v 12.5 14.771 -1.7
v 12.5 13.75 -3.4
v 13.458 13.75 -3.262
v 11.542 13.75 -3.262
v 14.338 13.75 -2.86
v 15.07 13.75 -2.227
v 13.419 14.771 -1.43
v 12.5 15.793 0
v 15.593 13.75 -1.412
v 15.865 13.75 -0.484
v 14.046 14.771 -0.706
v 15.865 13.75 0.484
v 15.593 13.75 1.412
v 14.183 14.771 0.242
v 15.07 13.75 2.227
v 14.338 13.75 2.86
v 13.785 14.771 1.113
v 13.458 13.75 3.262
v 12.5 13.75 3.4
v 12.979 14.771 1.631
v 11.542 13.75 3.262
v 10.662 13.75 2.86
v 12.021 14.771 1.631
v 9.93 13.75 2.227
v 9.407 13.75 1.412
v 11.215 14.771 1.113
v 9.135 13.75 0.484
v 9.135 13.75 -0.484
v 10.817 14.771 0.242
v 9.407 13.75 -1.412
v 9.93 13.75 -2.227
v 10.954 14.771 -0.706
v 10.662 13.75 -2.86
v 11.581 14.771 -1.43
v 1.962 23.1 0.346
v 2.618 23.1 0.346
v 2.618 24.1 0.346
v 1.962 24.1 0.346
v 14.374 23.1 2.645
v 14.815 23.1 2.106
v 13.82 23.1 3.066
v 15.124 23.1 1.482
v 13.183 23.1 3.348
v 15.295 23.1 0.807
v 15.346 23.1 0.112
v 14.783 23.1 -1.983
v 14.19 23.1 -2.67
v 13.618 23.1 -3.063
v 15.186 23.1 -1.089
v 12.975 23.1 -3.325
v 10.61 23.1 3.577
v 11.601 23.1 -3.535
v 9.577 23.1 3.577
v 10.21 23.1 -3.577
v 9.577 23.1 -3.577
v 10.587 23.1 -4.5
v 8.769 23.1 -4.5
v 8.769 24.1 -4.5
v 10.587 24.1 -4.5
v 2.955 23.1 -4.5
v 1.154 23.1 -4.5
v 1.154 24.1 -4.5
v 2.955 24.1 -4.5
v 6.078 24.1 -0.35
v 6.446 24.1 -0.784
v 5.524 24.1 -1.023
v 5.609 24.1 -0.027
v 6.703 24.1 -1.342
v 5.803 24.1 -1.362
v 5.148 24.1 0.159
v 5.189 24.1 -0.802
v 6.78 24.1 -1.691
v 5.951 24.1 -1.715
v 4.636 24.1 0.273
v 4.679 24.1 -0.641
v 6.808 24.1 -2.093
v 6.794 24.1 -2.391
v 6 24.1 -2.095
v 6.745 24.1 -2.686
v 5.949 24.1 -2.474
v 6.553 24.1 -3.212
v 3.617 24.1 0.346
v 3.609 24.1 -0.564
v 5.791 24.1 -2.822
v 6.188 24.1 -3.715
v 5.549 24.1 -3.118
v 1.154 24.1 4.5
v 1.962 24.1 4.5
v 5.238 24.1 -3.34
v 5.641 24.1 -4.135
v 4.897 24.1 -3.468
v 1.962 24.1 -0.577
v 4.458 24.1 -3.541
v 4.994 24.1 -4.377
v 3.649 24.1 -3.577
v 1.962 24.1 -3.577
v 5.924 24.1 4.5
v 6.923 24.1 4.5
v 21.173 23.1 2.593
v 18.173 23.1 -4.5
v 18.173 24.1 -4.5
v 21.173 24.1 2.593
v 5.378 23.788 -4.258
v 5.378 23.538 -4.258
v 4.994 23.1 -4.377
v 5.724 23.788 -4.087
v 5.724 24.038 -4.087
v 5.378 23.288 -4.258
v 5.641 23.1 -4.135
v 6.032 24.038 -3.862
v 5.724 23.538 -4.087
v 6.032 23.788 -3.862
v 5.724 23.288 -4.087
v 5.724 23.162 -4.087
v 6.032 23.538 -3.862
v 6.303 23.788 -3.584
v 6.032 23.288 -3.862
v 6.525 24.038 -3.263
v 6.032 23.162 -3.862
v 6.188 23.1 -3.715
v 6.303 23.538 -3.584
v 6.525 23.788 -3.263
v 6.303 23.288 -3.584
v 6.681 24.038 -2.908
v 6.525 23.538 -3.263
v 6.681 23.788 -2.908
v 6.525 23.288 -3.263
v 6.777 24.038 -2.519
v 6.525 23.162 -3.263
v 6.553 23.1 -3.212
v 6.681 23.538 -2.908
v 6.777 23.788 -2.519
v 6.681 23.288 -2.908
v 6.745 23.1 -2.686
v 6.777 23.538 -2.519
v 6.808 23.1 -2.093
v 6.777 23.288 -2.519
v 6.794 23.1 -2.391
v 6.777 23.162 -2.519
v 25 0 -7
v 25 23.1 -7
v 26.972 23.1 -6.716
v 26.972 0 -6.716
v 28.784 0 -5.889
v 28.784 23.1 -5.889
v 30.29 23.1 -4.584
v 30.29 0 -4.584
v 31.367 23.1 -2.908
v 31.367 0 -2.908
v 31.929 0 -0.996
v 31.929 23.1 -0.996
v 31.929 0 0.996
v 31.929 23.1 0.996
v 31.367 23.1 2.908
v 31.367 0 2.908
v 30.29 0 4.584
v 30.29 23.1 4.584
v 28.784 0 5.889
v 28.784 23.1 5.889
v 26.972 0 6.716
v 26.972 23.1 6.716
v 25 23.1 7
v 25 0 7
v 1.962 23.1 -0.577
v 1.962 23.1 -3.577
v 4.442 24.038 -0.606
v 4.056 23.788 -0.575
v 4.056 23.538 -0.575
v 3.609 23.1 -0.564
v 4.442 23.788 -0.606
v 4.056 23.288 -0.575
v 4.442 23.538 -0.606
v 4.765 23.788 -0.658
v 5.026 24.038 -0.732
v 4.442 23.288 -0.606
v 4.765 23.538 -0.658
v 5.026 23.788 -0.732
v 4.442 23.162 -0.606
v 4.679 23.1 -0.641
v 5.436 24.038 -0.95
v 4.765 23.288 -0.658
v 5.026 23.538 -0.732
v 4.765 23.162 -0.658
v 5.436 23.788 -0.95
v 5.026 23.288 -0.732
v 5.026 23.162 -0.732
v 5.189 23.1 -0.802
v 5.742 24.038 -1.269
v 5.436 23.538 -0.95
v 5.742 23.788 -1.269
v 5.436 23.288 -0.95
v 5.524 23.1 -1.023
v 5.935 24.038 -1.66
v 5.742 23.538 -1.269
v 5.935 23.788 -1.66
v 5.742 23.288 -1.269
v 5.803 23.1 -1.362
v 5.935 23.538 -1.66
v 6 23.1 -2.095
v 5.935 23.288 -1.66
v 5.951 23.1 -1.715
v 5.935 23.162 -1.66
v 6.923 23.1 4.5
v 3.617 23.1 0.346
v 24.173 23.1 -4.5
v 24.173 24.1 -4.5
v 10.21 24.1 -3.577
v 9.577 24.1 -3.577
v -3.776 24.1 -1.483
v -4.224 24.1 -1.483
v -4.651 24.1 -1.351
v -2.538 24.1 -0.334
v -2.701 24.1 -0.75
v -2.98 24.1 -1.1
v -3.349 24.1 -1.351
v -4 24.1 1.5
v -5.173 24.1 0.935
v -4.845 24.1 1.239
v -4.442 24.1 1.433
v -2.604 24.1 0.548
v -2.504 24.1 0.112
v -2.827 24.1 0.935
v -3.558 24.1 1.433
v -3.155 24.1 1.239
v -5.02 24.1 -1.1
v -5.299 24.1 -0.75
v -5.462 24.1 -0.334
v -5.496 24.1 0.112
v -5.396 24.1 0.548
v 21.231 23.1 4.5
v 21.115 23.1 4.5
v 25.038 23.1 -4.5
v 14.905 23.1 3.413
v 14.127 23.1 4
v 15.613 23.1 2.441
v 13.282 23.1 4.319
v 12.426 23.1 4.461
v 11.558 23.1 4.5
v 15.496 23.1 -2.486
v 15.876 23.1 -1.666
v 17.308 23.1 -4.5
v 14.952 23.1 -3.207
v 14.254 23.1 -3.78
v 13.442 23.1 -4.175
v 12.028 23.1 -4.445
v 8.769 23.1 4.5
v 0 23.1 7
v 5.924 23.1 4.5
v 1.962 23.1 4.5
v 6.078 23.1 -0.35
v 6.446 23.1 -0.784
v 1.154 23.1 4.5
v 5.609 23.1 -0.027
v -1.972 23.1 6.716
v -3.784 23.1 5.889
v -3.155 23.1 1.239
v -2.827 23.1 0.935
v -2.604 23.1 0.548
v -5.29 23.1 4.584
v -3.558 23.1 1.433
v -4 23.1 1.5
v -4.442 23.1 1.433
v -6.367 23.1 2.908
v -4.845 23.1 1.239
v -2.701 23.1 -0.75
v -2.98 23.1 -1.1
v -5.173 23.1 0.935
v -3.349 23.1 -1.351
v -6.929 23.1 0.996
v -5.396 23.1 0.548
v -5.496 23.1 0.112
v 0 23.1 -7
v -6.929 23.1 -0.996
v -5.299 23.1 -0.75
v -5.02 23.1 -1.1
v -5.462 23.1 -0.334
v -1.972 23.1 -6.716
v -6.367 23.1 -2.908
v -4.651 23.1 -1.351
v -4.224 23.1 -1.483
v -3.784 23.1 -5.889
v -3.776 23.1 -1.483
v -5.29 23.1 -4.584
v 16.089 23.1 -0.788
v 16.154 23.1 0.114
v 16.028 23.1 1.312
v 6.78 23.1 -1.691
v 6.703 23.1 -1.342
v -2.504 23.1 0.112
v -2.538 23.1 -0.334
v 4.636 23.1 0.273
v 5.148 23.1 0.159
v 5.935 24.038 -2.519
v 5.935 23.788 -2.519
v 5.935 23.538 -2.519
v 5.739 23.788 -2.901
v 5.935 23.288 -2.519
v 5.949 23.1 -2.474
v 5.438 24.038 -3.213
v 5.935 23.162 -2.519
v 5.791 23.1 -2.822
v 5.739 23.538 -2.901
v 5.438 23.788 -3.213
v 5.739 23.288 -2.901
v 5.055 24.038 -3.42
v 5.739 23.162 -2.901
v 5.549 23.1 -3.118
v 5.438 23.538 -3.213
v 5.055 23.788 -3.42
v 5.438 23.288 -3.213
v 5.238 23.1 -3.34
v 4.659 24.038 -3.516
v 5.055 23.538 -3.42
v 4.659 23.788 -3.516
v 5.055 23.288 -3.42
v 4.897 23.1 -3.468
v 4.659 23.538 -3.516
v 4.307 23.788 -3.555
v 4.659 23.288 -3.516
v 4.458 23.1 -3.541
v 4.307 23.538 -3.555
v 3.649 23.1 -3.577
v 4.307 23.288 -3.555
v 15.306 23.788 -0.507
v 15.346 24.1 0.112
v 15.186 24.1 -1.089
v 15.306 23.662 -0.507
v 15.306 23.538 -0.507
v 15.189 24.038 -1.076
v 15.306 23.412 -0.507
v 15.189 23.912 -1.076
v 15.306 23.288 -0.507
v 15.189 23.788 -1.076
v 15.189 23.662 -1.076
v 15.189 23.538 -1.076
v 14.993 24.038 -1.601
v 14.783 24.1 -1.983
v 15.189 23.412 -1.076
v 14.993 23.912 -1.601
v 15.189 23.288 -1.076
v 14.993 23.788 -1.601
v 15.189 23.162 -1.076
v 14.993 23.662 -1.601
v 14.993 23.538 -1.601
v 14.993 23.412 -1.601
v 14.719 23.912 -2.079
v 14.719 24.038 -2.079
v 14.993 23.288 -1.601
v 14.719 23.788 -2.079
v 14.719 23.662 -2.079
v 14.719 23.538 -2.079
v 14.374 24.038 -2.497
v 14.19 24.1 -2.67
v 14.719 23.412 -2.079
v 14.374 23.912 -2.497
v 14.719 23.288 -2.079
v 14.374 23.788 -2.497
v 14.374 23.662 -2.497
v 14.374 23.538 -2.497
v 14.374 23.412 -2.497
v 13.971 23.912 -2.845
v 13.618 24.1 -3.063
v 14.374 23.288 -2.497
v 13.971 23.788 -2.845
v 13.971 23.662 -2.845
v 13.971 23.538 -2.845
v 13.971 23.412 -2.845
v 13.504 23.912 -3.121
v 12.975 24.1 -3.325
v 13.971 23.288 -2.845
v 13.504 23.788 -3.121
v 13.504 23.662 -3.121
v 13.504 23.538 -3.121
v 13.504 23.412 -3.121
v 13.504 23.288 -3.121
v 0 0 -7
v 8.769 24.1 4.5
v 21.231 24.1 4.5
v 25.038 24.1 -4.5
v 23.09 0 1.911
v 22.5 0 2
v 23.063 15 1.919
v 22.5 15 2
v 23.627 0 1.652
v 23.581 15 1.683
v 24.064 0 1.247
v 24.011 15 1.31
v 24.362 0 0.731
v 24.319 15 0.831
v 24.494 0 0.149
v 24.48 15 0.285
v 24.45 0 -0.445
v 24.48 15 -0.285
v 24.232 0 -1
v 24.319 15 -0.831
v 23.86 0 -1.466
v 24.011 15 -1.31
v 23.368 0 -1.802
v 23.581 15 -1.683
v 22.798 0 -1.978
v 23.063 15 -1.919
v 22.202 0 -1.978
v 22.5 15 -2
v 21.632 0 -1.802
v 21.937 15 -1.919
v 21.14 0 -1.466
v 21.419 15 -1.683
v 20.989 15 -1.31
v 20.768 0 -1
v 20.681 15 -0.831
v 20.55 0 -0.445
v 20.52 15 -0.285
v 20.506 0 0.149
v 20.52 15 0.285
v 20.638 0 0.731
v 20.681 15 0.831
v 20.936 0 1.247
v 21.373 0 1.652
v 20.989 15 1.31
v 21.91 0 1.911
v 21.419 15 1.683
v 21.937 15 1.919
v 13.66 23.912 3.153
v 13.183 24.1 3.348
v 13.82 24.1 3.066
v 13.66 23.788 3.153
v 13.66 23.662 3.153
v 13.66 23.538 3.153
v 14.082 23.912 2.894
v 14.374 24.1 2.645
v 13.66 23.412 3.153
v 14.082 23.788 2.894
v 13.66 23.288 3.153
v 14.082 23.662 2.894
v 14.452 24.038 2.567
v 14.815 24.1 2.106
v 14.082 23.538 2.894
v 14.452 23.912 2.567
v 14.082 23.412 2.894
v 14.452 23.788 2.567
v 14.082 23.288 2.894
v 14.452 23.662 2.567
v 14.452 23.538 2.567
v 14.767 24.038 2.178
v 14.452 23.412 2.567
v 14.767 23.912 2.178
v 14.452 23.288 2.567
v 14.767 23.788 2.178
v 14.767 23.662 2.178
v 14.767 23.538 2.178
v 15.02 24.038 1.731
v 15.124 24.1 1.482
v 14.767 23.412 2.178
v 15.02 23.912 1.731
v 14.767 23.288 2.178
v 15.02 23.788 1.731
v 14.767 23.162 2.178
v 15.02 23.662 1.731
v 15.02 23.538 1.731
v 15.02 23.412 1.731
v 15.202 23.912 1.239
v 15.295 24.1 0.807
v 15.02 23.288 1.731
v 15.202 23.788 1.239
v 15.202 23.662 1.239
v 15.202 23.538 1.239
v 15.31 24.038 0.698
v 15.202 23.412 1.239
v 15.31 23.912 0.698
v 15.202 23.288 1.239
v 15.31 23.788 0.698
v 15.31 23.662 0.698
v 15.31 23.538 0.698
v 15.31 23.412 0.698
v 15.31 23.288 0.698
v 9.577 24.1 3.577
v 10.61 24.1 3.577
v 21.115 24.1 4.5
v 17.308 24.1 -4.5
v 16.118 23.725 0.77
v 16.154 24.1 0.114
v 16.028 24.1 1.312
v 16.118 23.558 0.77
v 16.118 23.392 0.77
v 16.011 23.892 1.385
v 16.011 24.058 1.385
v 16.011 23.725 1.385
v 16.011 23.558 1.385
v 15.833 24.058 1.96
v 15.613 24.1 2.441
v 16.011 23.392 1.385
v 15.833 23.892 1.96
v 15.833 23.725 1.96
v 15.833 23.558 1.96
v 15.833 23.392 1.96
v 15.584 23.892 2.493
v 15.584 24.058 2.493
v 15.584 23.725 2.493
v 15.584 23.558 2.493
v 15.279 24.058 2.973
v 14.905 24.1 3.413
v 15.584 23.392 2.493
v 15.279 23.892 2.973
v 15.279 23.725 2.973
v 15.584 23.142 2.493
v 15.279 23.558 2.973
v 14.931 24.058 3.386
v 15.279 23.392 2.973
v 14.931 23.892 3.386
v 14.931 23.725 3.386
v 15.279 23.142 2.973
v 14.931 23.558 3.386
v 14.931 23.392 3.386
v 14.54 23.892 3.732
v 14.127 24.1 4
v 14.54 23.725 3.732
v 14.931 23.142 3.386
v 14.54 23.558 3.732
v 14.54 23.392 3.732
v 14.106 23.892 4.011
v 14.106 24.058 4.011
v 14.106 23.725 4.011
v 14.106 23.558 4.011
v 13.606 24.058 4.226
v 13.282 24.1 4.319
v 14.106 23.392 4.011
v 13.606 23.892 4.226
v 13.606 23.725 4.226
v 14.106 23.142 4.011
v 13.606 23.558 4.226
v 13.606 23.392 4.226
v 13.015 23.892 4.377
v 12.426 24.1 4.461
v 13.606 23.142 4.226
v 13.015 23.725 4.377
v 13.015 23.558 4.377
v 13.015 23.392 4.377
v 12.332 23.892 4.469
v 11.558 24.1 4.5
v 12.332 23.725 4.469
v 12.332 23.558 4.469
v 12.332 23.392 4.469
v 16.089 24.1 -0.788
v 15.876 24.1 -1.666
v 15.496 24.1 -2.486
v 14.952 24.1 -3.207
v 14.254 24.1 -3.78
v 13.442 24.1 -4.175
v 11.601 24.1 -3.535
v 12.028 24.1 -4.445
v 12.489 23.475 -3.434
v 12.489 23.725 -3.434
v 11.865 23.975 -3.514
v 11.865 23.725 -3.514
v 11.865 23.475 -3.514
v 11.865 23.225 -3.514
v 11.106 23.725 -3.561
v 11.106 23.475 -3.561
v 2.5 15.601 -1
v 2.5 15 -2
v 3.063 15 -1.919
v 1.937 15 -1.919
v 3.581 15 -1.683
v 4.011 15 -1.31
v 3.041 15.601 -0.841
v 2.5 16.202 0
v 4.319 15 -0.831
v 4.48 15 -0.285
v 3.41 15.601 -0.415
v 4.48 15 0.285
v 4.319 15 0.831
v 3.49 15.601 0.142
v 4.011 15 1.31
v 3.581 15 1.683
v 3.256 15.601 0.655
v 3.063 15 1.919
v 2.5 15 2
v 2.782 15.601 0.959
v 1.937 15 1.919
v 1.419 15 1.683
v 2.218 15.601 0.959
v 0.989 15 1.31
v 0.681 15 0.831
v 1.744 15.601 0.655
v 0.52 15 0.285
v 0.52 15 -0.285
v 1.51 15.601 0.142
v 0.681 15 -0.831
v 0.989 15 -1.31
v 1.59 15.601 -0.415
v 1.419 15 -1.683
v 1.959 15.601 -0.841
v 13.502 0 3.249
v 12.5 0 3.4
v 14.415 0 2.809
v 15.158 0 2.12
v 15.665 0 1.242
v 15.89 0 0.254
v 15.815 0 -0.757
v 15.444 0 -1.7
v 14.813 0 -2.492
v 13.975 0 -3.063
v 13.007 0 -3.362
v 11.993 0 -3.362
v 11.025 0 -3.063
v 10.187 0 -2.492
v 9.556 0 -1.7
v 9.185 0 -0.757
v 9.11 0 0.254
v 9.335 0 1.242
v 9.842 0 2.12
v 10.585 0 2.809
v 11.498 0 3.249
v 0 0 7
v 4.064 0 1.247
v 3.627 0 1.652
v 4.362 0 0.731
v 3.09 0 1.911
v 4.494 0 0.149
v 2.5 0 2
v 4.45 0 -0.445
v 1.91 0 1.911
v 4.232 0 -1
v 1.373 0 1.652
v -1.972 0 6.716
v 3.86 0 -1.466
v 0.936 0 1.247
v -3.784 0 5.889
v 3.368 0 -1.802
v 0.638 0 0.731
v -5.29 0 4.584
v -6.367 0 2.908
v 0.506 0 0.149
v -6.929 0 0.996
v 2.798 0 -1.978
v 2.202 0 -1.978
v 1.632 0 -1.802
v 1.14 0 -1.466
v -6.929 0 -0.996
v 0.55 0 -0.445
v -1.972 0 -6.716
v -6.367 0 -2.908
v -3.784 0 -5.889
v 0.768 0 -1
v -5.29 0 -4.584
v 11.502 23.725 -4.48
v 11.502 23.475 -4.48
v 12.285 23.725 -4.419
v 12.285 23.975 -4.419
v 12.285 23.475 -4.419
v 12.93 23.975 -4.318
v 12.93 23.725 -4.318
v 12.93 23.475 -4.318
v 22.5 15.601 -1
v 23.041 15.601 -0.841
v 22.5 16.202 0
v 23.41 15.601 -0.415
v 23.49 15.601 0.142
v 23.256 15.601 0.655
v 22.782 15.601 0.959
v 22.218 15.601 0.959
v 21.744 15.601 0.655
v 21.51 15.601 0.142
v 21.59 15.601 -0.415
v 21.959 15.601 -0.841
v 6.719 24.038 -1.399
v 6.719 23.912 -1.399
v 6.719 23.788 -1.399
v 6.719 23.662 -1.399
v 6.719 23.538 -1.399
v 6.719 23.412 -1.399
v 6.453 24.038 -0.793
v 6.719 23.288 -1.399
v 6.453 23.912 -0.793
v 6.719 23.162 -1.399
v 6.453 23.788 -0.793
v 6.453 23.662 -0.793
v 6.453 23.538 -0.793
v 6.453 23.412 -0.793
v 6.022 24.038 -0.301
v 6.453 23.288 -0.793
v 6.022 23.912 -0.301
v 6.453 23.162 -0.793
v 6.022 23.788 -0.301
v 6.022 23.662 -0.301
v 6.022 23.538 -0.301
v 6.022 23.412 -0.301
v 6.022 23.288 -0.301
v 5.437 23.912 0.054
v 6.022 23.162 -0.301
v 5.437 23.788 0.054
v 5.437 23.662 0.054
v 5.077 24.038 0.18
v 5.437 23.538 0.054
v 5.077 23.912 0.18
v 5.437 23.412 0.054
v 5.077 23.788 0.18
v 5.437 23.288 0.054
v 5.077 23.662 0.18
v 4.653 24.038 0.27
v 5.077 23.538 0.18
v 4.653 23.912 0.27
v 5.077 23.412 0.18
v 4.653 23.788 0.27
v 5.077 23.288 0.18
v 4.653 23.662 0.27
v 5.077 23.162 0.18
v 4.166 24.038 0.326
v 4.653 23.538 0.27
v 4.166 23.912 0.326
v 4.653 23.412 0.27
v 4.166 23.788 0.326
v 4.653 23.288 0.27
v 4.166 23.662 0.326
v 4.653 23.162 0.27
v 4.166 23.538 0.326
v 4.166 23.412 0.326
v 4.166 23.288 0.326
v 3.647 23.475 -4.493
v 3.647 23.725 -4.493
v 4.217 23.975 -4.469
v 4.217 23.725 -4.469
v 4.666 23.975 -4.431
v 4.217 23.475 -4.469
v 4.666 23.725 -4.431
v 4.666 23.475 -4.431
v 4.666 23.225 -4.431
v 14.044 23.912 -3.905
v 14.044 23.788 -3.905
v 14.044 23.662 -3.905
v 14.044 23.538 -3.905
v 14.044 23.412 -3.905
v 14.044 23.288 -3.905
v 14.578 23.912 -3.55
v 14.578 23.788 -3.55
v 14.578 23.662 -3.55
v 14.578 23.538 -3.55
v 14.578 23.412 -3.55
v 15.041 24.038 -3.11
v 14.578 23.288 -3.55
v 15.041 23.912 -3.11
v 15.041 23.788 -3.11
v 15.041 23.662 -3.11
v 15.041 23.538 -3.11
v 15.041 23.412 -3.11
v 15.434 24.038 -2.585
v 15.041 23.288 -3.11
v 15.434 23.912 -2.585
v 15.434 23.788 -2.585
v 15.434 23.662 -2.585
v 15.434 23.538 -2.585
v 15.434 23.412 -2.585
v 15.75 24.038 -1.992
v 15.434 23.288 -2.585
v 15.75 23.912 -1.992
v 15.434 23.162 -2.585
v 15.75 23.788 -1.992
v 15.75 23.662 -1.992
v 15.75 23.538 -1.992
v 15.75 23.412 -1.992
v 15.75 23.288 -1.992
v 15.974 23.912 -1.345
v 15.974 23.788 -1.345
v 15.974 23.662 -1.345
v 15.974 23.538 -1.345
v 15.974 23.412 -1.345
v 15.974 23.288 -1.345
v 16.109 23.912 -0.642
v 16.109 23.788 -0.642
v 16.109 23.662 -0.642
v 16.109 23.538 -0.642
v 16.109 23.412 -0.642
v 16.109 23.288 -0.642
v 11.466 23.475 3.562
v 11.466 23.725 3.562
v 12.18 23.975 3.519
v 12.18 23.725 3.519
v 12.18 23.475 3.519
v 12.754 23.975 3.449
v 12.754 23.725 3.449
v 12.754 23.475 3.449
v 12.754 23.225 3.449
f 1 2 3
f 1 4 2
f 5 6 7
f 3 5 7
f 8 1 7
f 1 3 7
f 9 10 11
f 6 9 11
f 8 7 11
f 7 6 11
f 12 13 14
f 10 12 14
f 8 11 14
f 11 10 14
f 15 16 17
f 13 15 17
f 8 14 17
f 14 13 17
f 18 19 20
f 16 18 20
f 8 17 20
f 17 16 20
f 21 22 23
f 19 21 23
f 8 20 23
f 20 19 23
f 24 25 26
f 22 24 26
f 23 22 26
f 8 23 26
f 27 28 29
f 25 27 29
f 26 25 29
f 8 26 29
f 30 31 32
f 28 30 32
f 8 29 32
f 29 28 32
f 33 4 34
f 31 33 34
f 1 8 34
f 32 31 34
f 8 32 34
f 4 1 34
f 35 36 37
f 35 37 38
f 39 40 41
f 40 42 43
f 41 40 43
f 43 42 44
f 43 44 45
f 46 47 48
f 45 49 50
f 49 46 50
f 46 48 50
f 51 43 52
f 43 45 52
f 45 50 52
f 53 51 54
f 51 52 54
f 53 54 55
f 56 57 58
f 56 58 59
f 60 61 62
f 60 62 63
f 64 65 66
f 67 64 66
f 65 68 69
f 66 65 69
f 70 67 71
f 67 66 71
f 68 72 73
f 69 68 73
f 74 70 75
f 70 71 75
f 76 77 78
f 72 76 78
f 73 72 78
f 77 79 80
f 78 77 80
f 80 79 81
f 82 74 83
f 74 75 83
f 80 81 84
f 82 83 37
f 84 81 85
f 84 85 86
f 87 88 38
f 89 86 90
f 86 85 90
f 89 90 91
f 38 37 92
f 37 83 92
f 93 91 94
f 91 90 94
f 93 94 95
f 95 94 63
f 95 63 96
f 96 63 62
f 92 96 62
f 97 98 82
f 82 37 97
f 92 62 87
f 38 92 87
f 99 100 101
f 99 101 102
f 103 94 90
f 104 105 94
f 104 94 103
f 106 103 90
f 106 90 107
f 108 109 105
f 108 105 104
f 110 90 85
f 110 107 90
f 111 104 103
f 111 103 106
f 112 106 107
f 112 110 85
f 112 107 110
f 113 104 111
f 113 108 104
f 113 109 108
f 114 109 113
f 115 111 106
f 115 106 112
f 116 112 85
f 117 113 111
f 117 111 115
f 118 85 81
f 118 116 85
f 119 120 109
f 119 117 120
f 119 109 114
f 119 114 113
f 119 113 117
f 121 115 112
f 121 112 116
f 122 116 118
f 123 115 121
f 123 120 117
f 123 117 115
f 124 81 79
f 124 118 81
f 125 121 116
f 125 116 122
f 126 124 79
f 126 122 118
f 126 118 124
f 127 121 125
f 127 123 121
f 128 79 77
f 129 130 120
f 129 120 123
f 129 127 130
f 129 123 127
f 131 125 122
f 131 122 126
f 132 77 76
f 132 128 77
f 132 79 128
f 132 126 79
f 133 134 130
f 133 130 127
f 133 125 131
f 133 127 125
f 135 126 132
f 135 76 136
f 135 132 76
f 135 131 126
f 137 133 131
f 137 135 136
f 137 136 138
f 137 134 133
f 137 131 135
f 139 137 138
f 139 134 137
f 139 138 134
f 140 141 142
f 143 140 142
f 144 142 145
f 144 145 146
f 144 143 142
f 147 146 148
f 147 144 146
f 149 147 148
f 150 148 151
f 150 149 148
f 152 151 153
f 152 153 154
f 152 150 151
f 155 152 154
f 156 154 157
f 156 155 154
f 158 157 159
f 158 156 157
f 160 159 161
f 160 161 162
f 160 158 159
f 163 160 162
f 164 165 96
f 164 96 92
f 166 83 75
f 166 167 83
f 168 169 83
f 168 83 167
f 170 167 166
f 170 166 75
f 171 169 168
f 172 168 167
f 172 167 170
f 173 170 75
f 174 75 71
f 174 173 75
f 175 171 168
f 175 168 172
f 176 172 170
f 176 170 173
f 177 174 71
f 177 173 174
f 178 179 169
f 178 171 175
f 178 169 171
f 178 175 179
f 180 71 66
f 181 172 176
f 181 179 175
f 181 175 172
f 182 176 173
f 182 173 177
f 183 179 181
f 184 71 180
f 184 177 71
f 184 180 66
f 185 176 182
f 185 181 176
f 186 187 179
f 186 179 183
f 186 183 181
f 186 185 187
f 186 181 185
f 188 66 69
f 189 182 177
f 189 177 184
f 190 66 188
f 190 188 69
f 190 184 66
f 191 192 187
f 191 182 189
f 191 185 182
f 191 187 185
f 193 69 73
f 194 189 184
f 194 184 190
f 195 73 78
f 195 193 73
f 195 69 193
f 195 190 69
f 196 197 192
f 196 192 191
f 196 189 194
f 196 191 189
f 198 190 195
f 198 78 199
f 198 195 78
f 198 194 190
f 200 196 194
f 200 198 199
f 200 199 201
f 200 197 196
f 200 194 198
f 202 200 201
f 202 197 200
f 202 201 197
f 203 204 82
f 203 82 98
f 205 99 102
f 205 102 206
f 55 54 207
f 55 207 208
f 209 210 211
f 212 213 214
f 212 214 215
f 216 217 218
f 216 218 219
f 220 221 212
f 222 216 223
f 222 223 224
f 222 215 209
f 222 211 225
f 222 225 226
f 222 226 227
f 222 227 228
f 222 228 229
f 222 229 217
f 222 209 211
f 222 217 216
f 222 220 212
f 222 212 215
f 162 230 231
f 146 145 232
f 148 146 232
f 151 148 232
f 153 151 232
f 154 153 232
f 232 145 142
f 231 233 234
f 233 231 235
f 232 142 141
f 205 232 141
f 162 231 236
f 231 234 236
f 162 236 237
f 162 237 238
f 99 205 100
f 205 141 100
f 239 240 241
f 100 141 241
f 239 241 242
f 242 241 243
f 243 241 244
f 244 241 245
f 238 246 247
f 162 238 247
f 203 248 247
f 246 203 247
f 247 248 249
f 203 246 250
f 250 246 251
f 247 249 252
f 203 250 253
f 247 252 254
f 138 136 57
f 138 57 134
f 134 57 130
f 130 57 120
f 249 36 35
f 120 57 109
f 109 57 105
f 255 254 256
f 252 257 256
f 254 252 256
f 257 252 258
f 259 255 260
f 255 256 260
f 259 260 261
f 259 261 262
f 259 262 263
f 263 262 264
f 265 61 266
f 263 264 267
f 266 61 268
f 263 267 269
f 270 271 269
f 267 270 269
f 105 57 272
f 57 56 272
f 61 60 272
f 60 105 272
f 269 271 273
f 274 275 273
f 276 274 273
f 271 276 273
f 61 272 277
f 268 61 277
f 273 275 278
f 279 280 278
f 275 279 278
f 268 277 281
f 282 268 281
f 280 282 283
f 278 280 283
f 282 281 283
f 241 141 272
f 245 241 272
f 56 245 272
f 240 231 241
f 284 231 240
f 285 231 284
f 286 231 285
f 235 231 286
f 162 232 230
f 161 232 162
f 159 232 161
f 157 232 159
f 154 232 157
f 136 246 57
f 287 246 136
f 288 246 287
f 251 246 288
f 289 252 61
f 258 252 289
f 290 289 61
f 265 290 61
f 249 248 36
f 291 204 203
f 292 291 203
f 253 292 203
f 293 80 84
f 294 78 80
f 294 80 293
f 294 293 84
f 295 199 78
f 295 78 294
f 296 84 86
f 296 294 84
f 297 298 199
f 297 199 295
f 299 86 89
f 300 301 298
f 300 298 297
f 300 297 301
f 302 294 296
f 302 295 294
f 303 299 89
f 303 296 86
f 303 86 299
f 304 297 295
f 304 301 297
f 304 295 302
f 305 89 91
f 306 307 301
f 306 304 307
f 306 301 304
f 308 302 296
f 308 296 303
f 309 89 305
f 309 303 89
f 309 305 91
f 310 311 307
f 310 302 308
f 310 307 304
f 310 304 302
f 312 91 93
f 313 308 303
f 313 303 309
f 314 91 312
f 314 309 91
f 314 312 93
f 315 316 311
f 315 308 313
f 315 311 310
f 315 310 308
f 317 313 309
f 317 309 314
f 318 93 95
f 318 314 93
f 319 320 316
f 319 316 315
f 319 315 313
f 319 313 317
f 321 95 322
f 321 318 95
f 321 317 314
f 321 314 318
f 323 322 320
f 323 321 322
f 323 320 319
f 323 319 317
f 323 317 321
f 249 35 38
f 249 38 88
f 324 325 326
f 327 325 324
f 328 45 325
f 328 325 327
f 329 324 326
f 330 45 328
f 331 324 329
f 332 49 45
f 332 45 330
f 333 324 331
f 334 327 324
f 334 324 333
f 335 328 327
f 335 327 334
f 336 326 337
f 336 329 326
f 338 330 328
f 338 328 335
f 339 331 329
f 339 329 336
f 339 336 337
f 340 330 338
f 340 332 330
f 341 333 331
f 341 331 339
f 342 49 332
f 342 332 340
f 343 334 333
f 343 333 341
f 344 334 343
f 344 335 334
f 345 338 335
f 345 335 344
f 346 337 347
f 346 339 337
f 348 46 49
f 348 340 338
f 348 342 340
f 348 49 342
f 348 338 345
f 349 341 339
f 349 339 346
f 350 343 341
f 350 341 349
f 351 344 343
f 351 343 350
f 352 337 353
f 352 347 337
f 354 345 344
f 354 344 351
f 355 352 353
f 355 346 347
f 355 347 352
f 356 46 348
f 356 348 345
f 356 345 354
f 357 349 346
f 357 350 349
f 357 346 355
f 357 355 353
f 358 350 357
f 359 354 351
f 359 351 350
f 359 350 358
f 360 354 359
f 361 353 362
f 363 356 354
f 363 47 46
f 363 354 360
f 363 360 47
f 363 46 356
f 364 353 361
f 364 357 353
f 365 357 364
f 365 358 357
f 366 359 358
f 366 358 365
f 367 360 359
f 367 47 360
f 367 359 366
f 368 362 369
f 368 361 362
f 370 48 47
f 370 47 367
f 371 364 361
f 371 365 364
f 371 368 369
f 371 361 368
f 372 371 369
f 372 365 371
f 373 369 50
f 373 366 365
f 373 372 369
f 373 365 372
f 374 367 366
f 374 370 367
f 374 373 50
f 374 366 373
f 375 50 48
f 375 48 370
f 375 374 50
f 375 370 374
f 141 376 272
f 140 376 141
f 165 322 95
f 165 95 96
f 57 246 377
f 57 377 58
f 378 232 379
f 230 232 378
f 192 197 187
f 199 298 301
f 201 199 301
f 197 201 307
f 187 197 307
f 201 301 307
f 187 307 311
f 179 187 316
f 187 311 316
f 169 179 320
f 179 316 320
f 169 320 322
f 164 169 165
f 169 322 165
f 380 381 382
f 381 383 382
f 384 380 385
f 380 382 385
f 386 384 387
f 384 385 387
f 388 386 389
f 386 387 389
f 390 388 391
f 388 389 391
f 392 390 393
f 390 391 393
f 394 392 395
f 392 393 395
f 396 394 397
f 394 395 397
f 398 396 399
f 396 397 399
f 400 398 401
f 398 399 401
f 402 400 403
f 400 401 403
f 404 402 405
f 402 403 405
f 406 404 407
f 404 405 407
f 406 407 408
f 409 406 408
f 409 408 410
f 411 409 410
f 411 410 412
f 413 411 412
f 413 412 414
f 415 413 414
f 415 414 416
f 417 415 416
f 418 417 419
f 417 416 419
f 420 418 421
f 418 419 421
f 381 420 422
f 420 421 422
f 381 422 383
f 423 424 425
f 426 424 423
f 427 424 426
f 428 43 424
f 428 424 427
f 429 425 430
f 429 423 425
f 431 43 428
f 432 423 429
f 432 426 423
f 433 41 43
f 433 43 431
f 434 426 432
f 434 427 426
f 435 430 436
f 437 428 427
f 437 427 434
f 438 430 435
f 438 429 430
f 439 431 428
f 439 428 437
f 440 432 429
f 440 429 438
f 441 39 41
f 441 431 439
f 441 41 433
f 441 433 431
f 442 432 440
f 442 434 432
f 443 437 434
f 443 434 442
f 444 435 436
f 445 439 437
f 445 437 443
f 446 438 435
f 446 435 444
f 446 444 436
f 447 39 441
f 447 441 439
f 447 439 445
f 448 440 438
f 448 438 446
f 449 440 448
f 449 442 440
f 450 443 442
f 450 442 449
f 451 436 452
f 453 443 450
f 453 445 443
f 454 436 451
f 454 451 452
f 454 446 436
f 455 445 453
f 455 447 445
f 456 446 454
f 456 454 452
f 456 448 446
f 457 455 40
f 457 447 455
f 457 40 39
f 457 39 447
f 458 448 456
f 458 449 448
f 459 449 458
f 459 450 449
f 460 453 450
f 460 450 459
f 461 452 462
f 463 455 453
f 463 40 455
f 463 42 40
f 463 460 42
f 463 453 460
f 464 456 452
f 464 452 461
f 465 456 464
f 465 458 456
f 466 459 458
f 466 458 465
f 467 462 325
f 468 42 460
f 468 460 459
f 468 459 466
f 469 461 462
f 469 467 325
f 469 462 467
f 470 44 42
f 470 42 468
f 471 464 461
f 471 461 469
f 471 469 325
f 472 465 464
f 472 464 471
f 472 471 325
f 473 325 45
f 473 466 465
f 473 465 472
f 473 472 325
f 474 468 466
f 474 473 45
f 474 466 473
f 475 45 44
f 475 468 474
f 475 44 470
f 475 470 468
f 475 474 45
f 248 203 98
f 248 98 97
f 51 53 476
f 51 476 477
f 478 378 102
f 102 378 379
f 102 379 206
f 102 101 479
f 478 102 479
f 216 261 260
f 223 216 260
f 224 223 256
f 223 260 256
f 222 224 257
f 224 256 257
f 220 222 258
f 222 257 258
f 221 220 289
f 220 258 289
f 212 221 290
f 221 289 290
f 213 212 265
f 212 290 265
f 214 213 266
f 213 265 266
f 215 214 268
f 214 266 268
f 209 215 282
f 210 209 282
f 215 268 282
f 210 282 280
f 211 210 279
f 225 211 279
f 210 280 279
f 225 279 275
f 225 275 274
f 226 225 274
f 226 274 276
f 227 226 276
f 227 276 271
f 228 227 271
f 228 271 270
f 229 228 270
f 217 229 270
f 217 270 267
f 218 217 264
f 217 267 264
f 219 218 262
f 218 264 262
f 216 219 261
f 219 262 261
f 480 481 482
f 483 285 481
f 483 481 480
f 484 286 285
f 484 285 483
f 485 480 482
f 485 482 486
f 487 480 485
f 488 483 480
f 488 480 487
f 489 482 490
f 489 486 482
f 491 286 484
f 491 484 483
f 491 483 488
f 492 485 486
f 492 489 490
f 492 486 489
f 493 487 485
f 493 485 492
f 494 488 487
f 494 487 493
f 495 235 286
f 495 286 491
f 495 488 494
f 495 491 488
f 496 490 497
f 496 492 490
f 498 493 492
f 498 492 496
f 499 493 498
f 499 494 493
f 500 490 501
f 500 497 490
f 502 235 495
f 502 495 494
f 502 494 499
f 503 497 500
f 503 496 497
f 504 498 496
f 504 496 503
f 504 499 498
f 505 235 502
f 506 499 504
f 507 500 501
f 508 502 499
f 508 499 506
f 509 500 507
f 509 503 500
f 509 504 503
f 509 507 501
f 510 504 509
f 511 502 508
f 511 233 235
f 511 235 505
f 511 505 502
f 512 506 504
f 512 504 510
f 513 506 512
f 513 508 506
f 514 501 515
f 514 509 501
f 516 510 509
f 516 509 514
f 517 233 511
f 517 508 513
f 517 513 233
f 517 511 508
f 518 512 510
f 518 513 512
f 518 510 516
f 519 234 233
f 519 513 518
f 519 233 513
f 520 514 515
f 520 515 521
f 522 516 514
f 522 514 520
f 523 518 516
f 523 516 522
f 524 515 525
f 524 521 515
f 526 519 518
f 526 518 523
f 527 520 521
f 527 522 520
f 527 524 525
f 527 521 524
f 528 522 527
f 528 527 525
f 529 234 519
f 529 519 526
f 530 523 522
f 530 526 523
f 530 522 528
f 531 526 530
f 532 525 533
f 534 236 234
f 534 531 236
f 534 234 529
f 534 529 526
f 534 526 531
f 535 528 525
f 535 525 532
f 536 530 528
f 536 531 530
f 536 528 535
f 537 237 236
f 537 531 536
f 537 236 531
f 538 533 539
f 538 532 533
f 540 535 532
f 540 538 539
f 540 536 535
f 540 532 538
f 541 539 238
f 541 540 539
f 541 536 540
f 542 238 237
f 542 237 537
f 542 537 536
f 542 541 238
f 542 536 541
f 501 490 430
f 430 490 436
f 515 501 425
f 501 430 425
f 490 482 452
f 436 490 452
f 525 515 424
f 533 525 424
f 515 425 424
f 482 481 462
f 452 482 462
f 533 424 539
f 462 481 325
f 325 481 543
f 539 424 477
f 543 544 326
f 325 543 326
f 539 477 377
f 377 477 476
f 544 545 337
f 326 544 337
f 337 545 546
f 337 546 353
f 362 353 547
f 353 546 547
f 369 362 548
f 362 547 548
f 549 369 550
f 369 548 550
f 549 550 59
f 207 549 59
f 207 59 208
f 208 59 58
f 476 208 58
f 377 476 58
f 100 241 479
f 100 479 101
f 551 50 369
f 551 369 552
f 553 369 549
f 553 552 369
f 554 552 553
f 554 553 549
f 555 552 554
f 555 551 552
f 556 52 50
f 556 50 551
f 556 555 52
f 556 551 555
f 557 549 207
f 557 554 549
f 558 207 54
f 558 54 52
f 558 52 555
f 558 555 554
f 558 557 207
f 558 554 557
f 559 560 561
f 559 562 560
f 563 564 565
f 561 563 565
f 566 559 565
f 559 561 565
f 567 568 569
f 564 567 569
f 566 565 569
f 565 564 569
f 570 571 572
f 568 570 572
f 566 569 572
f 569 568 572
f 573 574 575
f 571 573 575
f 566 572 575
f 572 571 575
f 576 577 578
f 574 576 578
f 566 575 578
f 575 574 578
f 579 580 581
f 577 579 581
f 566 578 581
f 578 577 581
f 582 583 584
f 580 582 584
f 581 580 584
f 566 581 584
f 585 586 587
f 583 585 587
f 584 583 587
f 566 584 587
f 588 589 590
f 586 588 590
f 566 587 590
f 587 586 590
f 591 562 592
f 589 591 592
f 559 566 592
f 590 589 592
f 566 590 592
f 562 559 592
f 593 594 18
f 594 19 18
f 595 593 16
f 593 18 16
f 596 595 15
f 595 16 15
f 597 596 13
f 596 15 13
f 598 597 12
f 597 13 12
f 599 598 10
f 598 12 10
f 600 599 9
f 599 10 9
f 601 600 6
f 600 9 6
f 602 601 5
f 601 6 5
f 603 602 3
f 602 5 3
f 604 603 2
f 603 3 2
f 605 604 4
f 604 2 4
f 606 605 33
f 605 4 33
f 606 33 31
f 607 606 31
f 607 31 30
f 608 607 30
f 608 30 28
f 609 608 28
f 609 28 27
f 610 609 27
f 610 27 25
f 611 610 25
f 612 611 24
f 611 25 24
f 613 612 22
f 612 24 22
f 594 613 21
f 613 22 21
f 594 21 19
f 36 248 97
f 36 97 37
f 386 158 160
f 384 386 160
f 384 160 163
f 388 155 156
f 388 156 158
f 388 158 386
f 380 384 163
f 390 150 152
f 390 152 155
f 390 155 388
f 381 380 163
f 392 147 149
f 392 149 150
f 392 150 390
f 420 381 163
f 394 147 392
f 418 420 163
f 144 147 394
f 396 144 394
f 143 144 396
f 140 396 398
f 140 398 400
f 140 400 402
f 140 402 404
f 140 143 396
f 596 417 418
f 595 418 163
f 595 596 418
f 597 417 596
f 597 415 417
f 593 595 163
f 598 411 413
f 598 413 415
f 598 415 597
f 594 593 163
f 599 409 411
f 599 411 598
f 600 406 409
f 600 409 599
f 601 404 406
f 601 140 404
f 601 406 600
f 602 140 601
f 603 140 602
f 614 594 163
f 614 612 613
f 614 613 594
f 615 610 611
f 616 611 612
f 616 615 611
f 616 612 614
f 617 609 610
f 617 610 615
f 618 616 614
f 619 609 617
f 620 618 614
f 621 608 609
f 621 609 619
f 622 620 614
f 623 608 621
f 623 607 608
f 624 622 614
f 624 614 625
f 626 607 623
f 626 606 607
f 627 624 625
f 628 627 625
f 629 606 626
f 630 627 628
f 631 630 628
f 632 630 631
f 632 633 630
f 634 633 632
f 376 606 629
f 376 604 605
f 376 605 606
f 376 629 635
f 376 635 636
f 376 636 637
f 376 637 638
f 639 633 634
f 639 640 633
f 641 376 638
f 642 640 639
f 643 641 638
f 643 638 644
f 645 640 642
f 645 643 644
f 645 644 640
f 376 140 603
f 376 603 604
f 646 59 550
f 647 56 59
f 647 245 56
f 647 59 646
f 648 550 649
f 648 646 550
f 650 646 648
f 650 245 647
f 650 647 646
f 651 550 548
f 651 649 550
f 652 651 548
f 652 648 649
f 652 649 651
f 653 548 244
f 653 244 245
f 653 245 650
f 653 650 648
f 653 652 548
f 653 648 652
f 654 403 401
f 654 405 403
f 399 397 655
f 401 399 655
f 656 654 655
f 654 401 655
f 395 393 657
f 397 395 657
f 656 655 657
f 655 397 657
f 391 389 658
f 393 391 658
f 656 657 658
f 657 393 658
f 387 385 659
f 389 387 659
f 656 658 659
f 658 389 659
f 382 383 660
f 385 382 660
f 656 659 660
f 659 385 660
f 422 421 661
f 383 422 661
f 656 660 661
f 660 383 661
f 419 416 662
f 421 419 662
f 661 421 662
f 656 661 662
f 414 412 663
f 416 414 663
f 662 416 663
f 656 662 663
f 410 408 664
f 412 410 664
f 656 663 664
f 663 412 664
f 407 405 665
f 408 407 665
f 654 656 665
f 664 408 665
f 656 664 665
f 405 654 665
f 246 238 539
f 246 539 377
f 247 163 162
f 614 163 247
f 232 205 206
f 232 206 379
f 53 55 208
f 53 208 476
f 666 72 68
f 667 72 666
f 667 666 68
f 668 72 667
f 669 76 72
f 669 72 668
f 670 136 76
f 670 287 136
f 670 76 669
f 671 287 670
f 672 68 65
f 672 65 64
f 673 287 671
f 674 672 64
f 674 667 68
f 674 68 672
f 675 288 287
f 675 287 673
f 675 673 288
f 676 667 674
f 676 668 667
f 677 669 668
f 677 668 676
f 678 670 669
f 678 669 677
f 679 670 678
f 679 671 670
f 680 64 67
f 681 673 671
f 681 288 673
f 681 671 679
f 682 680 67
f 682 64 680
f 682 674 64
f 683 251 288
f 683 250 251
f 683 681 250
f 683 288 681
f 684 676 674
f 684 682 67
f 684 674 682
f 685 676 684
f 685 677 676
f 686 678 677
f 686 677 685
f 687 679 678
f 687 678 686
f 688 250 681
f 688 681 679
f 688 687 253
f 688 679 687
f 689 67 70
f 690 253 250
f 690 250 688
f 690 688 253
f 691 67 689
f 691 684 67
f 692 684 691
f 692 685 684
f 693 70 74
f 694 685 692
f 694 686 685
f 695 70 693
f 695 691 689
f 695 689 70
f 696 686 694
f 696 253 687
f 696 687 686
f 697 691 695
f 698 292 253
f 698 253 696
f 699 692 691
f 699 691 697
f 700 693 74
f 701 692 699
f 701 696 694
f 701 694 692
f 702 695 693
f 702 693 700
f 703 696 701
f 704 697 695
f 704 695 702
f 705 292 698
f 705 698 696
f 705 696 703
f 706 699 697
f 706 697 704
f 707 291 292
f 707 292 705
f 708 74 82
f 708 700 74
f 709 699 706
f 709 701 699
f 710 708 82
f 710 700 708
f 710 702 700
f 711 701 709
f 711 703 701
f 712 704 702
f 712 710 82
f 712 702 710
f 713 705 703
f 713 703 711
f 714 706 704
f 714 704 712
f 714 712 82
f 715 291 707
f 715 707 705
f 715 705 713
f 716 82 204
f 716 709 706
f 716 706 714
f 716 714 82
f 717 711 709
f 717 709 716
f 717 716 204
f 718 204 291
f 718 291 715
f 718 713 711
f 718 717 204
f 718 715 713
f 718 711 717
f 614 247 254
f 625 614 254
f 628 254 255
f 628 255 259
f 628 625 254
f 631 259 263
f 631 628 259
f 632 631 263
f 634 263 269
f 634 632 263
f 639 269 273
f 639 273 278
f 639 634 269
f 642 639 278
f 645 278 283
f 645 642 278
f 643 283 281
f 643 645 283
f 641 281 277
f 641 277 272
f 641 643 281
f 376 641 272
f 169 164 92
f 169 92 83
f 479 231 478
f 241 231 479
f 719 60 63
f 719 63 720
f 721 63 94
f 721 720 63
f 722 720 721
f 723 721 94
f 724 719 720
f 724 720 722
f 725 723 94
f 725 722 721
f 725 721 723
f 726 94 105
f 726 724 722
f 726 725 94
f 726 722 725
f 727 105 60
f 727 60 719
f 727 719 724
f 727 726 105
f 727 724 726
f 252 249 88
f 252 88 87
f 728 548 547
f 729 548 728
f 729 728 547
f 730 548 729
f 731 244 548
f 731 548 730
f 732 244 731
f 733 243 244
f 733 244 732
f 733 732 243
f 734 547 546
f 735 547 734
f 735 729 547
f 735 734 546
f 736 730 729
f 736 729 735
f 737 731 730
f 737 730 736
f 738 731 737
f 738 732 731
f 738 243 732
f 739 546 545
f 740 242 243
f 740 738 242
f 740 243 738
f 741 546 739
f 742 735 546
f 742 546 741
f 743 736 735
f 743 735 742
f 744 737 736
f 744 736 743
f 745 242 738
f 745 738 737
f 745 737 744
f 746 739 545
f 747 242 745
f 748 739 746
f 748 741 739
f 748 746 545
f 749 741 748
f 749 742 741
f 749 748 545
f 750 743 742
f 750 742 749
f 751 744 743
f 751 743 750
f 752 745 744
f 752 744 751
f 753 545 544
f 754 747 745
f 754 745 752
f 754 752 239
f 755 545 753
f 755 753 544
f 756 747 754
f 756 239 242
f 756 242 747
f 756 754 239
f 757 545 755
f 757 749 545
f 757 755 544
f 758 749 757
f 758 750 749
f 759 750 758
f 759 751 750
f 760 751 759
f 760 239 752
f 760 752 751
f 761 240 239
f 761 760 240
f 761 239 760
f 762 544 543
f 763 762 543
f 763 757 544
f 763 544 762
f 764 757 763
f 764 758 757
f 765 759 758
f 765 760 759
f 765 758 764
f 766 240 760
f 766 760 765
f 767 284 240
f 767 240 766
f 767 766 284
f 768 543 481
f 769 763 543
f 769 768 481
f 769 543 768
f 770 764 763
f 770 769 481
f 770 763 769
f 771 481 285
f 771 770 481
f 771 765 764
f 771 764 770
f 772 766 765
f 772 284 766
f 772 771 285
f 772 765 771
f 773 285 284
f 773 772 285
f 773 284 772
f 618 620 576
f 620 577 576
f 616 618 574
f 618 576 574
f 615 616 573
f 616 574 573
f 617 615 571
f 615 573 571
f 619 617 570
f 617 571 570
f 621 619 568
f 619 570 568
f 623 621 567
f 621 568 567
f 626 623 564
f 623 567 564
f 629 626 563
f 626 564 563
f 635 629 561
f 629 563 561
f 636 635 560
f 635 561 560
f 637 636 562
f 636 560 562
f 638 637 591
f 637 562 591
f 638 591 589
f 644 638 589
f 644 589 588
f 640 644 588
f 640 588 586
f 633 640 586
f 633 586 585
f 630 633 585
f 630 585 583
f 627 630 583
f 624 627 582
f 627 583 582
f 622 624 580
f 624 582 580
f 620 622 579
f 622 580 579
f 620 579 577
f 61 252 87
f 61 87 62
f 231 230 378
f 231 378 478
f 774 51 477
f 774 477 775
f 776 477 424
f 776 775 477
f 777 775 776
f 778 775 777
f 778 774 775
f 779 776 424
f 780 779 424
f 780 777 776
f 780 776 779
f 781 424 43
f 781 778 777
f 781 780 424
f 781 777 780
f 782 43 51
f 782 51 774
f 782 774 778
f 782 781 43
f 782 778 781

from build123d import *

# Parameters (mm, degrees)
BOSS_EXTRUDE1_DEPTH       = 23.1
BOSS_EXTRUDE3_DEPTH       = 1
SKETCH8_R                 = 1.5
BOSS_EXTRUDE4_DEPTH       = 1
M8_TAPPED_HOLE1_D         = 6.8
M8_TAPPED_HOLE1_DEPTH     = 13.75
M8_TAPPED_HOLE1_TIP       = 2.042926105
F_4_0MM_DOWEL_HOLE1_D     = 4
F_4_0MM_DOWEL_HOLE1_DEPTH = 15
F_4_0MM_DOWEL_HOLE1_TIP   = 1.201721238
F_4_0MM_DOWEL_HOLE2_D     = 4
F_4_0MM_DOWEL_HOLE2_DEPTH = 15
F_4_0MM_DOWEL_HOLE2_TIP   = 1.201721238


with BuildPart() as part:
    # Sketch1 → Boss-Extrude1 (new body)
    with BuildSketch(Plane(origin=(0, 0, 0), x_dir=(1, 0, 0), z_dir=(0, 1, 0))):
        with BuildLine():
            Line((0, 7), (25, 7))
            ThreePointArc((25, 7), (32, 0), (25, -7))
            Line((25, -7), (0, -7))
            ThreePointArc((0, -7), (-7, 0), (0, 7))
        make_face()
    extrude(amount=BOSS_EXTRUDE1_DEPTH)

    # Sketch6 → Boss-Extrude3 (add)
    # profile 1 of 3: a face of its own
    with BuildSketch(Plane(origin=(0, 23.1, 0), x_dir=(1, 0, 0), z_dir=(0, 1, 0))):
        with BuildLine():
            Line((1.153846154, 4.5), (2.954927885, 4.5))
            add(Edge.make_bspline(
                [(2.954927885, 4.5), (3.075119358, 4.499599922), (3.305900301, 4.498831727), (3.636517282, 4.494548337), (3.936929817, 4.482271422), (4.206980832, 4.471706493), (4.446665374, 4.452441501), (4.656718407, 4.434028409), (4.836172486, 4.40992471), (4.944804675, 4.387539336), (4.993990385, 4.377403846)],
                knots=[0, 0, 0, 0, 1.410062039, 2.707475311, 3.878576406, 4.937260626, 5.877586885, 6.699081471, 7.410979367, 8, 8, 8, 8], degree=3))
            add(Edge.make_bspline(
                [(4.993990385, 4.377403846), (5.05983599, 4.361135021), (5.190122534, 4.328944429), (5.377708418, 4.260905455), (5.556459537, 4.182169278), (5.725633371, 4.08969114), (5.884382548, 3.982784563), (6.034343919, 3.863295106), (6.176197967, 3.731876576), (6.304207874, 3.585215555), (6.424908292, 3.431350245), (6.526707617, 3.264969156), (6.614461422, 3.090982371), (6.684328466, 2.907620439), (6.740586112, 2.716661597), (6.780253585, 2.51637612), (6.804042353, 2.30767647), (6.806464267, 2.165327562), (6.807692308, 2.093149038)],
                knots=[0, 0, 0, 0, 1.027469482, 2.033020251, 3.019912614, 3.986113645, 4.951240523, 5.91722682, 6.890402269, 7.87763091, 8.8651537, 9.85103654, 10.82876324, 11.815024772, 12.821070561, 13.842952187, 14.906261191, 16, 16, 16, 16], degree=3))
            add(Edge.make_bspline(
                [(6.807692308, 2.093149038), (6.803914884, 1.973230198), (6.796544152, 1.739237481), (6.727822457, 1.399652357), (6.615254263, 1.082879834), (6.460137234, 0.789318765), (6.26260144, 0.524691391), (6.025194834, 0.292258792), (5.747784976, 0.097756159), (5.489538163, -0.037122481), (5.261415936, -0.123504247), (5.073615988, -0.184283455), (4.868758046, -0.231242794), (4.6488049, -0.273311705), (4.412841215, -0.305073204), (4.161432542, -0.328335876), (3.894399581, -0.342874858), (3.710956259, -0.345040014), (3.616586538, -0.346153846)],
                knots=[0, 0, 0, 0, 1.260483769, 2.459530307, 3.627416485, 4.787058657, 5.939039949, 7.08810263, 8.267026773, 9.491475466, 10.141966685, 10.831826277, 11.566392101, 12.351337768, 13.187381173, 14.07005841, 15.007169909, 16, 16, 16, 16], degree=3))
            Line((3.616586538, -0.346153846), (6.923076923, -4.5))
            Line((6.923076923, -4.5), (5.924278846, -4.5))
            Line((5.924278846, -4.5), (2.617788462, -0.346153846))
            Line((2.617788462, -0.346153846), (1.961538462, -0.346153846))
            Line((1.961538462, -0.346153846), (1.961538462, -4.5))
            Line((1.961538462, -4.5), (1.153846154, -4.5))
            Line((1.153846154, -4.5), (1.153846154, 4.5))
        make_face()
        with BuildLine():
            Line((1.961538462, 3.576923077), (1.961538462, 0.576923077))
            Line((1.961538462, 0.576923077), (3.609375, 0.564302885))
            add(Edge.make_bspline(
                [(3.609375, 0.564302885), (3.686312243, 0.564268848), (3.835438533, 0.564202874), (4.051183099, 0.574472584), (4.252063387, 0.586155403), (4.437311035, 0.604025148), (4.6070088, 0.627055047), (4.761071863, 0.655862721), (4.89975171, 0.689425168), (5.061490809, 0.741372205), (5.242099033, 0.823673395), (5.43837993, 0.943413249), (5.605528798, 1.094019555), (5.746746158, 1.266237014), (5.860221839, 1.455587368), (5.940224265, 1.659800889), (5.990990545, 1.873722141), (5.996978233, 2.020751561), (6, 2.094951923)],
                knots=[0, 0, 0, 0, 1.146690395, 2.22261258, 3.21895312, 4.145990853, 4.996080663, 5.770904154, 6.481378293, 7.121626537, 8.300444488, 9.431385265, 10.535395872, 11.636531494, 12.74115979, 13.810798291, 14.895190096, 16, 16, 16, 16], degree=3))
            add(Edge.make_bspline(
                [(6, 2.094951923), (5.996908831, 2.167328827), (5.990783263, 2.310753441), (5.940772144, 2.520725781), (5.856199449, 2.718897939), (5.742227981, 2.904463757), (5.603373011, 3.072907078), (5.440555778, 3.217028329), (5.258228133, 3.335955524), (5.08781648, 3.411952502), (4.935499934, 3.458546411), (4.803252237, 3.491335118), (4.653822723, 3.517678038), (4.486485829, 3.53878448), (4.301955921, 3.556925765), (4.099299961, 3.569144625), (3.879862526, 3.576380275), (3.727770418, 3.576737932), (3.649038462, 3.576923077)],
                knots=[0, 0, 0, 0, 1.101028733, 2.181837193, 3.264309656, 4.369019818, 5.486613113, 6.575447106, 7.666700264, 8.788928104, 9.402425223, 10.0903467, 10.862060571, 11.710948788, 12.657782767, 13.684531032, 14.801375019, 16, 16, 16, 16], degree=3))
            Line((3.649038462, 3.576923077), (1.961538462, 3.576923077))
        make_face(mode=Mode.SUBTRACT)
    # profile 2 of 3: a face of its own
    with BuildSketch(Plane(origin=(0, 23.1, 0), x_dir=(1, 0, 0), z_dir=(0, 1, 0))):
        with BuildLine():
            Line((8.769230769, -4.5), (8.769230769, 4.5))
            Line((8.769230769, 4.5), (10.586538462, 4.5))
            add(Edge.make_bspline(
                [(10.586538462, 4.5), (10.744601574, 4.498861963), (11.049978685, 4.496663281), (11.491267835, 4.482722561), (11.899568939, 4.458061363), (12.273539148, 4.422139724), (12.614205122, 4.378031924), (12.920612971, 4.32274517), (13.194347053, 4.257461303), (13.362697043, 4.201801574), (13.442307692, 4.175480769)],
                knots=[0, 0, 0, 0, 1.314313732, 2.53924729, 3.670748893, 4.714932338, 5.66265055, 6.526160246, 7.303039223, 8, 8, 8, 8], degree=3))
            add(Edge.make_bspline(
                [(13.442307692, 4.175480769), (13.546437022, 4.135801812), (13.752334374, 4.057343684), (14.045495546, 3.909341767), (14.321475051, 3.741650933), (14.581752852, 3.554050144), (14.820383548, 3.341227533), (15.046689568, 3.112223599), (15.251413144, 2.858710724), (15.438891619, 2.585946469), (15.607926172, 2.297144049), (15.754855435, 1.99285377), (15.87687999, 1.674620949), (15.978176858, 1.343330568), (16.058010606, 0.998254168), (16.11247843, 0.638989941), (16.148403833, 0.26695774), (16.152014251, 0.014509119), (16.153846154, -0.113581731)],
                knots=[0, 0, 0, 0, 0.984719456, 1.947108742, 2.898477687, 3.838006223, 4.779231079, 5.722358779, 6.681677486, 7.655904652, 8.64651281, 9.637519902, 10.640069247, 11.656948941, 12.698408672, 13.768548281, 14.867775369, 16, 16, 16, 16], degree=3))
            add(Edge.make_bspline(
                [(16.153846154, -0.113581731), (16.152228809, -0.224824915), (16.149041662, -0.44404123), (16.120423421, -0.767117819), (16.078827169, -1.080609859), (16.014427804, -1.383024516), (15.936249912, -1.677011362), (15.83605638, -1.959437134), (15.72127939, -2.232892643), (15.587436845, -2.493680439), (15.440501855, -2.740751967), (15.282817372, -2.973660468), (15.114551584, -3.189082467), (14.934099957, -3.387670327), (14.7437944, -3.569124671), (14.542388979, -3.734961282), (14.329363991, -3.88193528), (14.105673561, -4.01582213), (13.864792086, -4.13261733), (13.602157001, -4.231437355), (13.316648258, -4.313328652), (13.008966655, -4.381653812), (12.678580569, -4.435852591), (12.325166085, -4.4721776), (11.949266198, -4.496742284), (11.691148087, -4.49889301), (11.558293269, -4.5)],
                knots=[0, 0, 0, 0, 1.105936401, 2.179363191, 3.223086493, 4.248585256, 5.251745608, 6.245858792, 7.225916811, 8.198733463, 9.158002045, 10.082870192, 10.993790845, 11.873723703, 12.748670949, 13.606408763, 14.465103618, 15.319838547, 16.196477973, 17.123216899, 18.106603292, 19.147568657, 20.255746949, 21.433717677, 22.679120308, 24, 24, 24, 24], degree=3))
            Line((11.558293269, -4.5), (8.769230769, -4.5))
        make_face()
        with BuildLine():
            Line((9.576923077, -3.576923077), (10.609975962, -3.576923077))
            add(Edge.make_bspline(
                [(10.609975962, -3.576923077), (10.758420343, -3.576285115), (11.043933254, -3.57505808), (11.45448239, -3.564290986), (11.829600838, -3.546697433), (12.169341862, -3.522075804), (12.473513639, -3.489499365), (12.742751853, -3.453178187), (12.976173945, -3.407927599), (13.117421069, -3.366910846), (13.182692308, -3.347956731)],
                knots=[0, 0, 0, 0, 1.375205317, 2.645023457, 3.804390687, 4.853969522, 5.800190428, 6.637939096, 7.370582563, 8, 8, 8, 8], degree=3))
            add(Edge.make_bspline(
                [(13.182692308, -3.347956731), (13.264845239, -3.319024152), (13.42718888, -3.26185005), (13.660883099, -3.157558921), (13.878829682, -3.03402217), (14.08482689, -2.896702037), (14.275952576, -2.740755175), (14.454471732, -2.569572632), (14.620024935, -2.382283211), (14.770901727, -2.179119367), (14.90592308, -1.961345606), (15.022849099, -1.731102891), (15.125324466, -1.490913951), (15.205755133, -1.2370904), (15.268795206, -0.971901392), (15.313447261, -0.695328273), (15.341256552, -0.407422691), (15.344500276, -0.211602943), (15.346153846, -0.111778846)],
                knots=[0, 0, 0, 0, 0.998632004, 1.973411704, 2.929992603, 3.868527914, 4.809262121, 5.754881198, 6.702106254, 7.672490631, 8.653608572, 9.636854334, 10.631411391, 11.644891563, 12.686317036, 13.754757253, 14.855430412, 16, 16, 16, 16], degree=3))
            add(Edge.make_bspline(
                [(15.346153846, -0.111778846), (15.344833964, -0.006521325), (15.342241045, 0.200258006), (15.309649961, 0.503662651), (15.262023104, 0.795470038), (15.193150768, 1.075699683), (15.105385651, 1.344898303), (14.995856573, 1.601577044), (14.870713837, 1.848446706), (14.721819543, 2.079809361), (14.558750874, 2.298620213), (14.377779184, 2.49907571), (14.181779657, 2.681632483), (13.972890044, 2.849133572), (13.745223217, 2.994840167), (13.504142298, 3.125177347), (13.246110572, 3.235789639), (13.066592211, 3.294621001), (12.975360577, 3.324519231)],
                knots=[0, 0, 0, 0, 1.122418816, 2.205001699, 3.251619955, 4.274784885, 5.280384055, 6.268708349, 7.249350384, 8.229342522, 9.199999885, 10.157847722, 11.105861043, 12.055065948, 13.010012805, 13.98527497, 14.976112212, 16, 16, 16, 16], degree=3))
            add(Edge.make_bspline(
                [(12.975360577, 3.324519231), (12.899886201, 3.345390045), (12.739406968, 3.389767123), (12.477534061, 3.438175224), (12.182809391, 3.480872507), (11.853924445, 3.517021751), (11.491254122, 3.542960578), (11.094519496, 3.562429672), (10.663549084, 3.575561013), (10.364793997, 3.576457689), (10.209735577, 3.576923077)],
                knots=[0, 0, 0, 0, 0.674548936, 1.434276114, 2.292660221, 3.240891867, 4.284742987, 5.42552168, 6.663806718, 8, 8, 8, 8], degree=3))
            Line((10.209735577, 3.576923077), (9.576923077, 3.576923077))
            Line((9.576923077, 3.576923077), (9.576923077, -3.576923077))
        make_face(mode=Mode.SUBTRACT)
    # profile 3 of 3: a face of its own
    with BuildSketch(Plane(origin=(0, 23.1, 0), x_dir=(1, 0, 0), z_dir=(0, 1, 0))):
        Polygon((17.307692308, 4.5), (18.173076923, 4.5), (21.173076923, -2.592548077), (24.173076923, 4.5), (25.038461538, 4.5), (21.230769231, -4.5), (21.115384615, -4.5), align=None)
    extrude(amount=BOSS_EXTRUDE3_DEPTH)

    # Sketch8 → Boss-Extrude4 (add)
    with BuildSketch(Plane(origin=(0, 23.1, 0), x_dir=(1, 0, 0), z_dir=(0, 1, 0))):
        with Locations(Location((-4, 0, 0), (0, 0, 270))):
            Circle(SKETCH8_R)
    extrude(amount=BOSS_EXTRUDE4_DEPTH)

    # M8 Tapped Hole1
    with Locations(Plane(origin=(12.5, 0, 0), x_dir=(0, 0, -1), z_dir=(0, -1, 0))):
        with Locations((0, 0)):
            Hole(M8_TAPPED_HOLE1_D / 2, depth=M8_TAPPED_HOLE1_DEPTH)
            with Locations((0, 0, -(M8_TAPPED_HOLE1_DEPTH + M8_TAPPED_HOLE1_TIP / 2))):  # 118° drill point
                Cone(0, M8_TAPPED_HOLE1_D / 2, M8_TAPPED_HOLE1_TIP, mode=Mode.SUBTRACT)

    # Ø4.0mm Dowel Hole1
    with Locations(Plane(origin=(2.5, 0, 0), x_dir=(0, 0, -1), z_dir=(0, -1, 0))):
        with Locations((0, 0)):
            Hole(F_4_0MM_DOWEL_HOLE1_D / 2, depth=F_4_0MM_DOWEL_HOLE1_DEPTH)
            with Locations((0, 0, -(F_4_0MM_DOWEL_HOLE1_DEPTH + F_4_0MM_DOWEL_HOLE1_TIP / 2))):  # 118° drill point
                Cone(0, F_4_0MM_DOWEL_HOLE1_D / 2, F_4_0MM_DOWEL_HOLE1_TIP, mode=Mode.SUBTRACT)

    # Ø4.0mm Dowel Hole2
    with Locations(Plane(origin=(22.5, 0, 0), x_dir=(0, 0, -1), z_dir=(0, -1, 0))):
        with Locations((0, 0)):
            Hole(F_4_0MM_DOWEL_HOLE2_D / 2, depth=F_4_0MM_DOWEL_HOLE2_DEPTH)
            with Locations((0, 0, -(F_4_0MM_DOWEL_HOLE2_DEPTH + F_4_0MM_DOWEL_HOLE2_TIP / 2))):  # 118° drill point
                Cone(0, F_4_0MM_DOWEL_HOLE2_D / 2, F_4_0MM_DOWEL_HOLE2_TIP, mode=Mode.SUBTRACT)


solid = part.part
